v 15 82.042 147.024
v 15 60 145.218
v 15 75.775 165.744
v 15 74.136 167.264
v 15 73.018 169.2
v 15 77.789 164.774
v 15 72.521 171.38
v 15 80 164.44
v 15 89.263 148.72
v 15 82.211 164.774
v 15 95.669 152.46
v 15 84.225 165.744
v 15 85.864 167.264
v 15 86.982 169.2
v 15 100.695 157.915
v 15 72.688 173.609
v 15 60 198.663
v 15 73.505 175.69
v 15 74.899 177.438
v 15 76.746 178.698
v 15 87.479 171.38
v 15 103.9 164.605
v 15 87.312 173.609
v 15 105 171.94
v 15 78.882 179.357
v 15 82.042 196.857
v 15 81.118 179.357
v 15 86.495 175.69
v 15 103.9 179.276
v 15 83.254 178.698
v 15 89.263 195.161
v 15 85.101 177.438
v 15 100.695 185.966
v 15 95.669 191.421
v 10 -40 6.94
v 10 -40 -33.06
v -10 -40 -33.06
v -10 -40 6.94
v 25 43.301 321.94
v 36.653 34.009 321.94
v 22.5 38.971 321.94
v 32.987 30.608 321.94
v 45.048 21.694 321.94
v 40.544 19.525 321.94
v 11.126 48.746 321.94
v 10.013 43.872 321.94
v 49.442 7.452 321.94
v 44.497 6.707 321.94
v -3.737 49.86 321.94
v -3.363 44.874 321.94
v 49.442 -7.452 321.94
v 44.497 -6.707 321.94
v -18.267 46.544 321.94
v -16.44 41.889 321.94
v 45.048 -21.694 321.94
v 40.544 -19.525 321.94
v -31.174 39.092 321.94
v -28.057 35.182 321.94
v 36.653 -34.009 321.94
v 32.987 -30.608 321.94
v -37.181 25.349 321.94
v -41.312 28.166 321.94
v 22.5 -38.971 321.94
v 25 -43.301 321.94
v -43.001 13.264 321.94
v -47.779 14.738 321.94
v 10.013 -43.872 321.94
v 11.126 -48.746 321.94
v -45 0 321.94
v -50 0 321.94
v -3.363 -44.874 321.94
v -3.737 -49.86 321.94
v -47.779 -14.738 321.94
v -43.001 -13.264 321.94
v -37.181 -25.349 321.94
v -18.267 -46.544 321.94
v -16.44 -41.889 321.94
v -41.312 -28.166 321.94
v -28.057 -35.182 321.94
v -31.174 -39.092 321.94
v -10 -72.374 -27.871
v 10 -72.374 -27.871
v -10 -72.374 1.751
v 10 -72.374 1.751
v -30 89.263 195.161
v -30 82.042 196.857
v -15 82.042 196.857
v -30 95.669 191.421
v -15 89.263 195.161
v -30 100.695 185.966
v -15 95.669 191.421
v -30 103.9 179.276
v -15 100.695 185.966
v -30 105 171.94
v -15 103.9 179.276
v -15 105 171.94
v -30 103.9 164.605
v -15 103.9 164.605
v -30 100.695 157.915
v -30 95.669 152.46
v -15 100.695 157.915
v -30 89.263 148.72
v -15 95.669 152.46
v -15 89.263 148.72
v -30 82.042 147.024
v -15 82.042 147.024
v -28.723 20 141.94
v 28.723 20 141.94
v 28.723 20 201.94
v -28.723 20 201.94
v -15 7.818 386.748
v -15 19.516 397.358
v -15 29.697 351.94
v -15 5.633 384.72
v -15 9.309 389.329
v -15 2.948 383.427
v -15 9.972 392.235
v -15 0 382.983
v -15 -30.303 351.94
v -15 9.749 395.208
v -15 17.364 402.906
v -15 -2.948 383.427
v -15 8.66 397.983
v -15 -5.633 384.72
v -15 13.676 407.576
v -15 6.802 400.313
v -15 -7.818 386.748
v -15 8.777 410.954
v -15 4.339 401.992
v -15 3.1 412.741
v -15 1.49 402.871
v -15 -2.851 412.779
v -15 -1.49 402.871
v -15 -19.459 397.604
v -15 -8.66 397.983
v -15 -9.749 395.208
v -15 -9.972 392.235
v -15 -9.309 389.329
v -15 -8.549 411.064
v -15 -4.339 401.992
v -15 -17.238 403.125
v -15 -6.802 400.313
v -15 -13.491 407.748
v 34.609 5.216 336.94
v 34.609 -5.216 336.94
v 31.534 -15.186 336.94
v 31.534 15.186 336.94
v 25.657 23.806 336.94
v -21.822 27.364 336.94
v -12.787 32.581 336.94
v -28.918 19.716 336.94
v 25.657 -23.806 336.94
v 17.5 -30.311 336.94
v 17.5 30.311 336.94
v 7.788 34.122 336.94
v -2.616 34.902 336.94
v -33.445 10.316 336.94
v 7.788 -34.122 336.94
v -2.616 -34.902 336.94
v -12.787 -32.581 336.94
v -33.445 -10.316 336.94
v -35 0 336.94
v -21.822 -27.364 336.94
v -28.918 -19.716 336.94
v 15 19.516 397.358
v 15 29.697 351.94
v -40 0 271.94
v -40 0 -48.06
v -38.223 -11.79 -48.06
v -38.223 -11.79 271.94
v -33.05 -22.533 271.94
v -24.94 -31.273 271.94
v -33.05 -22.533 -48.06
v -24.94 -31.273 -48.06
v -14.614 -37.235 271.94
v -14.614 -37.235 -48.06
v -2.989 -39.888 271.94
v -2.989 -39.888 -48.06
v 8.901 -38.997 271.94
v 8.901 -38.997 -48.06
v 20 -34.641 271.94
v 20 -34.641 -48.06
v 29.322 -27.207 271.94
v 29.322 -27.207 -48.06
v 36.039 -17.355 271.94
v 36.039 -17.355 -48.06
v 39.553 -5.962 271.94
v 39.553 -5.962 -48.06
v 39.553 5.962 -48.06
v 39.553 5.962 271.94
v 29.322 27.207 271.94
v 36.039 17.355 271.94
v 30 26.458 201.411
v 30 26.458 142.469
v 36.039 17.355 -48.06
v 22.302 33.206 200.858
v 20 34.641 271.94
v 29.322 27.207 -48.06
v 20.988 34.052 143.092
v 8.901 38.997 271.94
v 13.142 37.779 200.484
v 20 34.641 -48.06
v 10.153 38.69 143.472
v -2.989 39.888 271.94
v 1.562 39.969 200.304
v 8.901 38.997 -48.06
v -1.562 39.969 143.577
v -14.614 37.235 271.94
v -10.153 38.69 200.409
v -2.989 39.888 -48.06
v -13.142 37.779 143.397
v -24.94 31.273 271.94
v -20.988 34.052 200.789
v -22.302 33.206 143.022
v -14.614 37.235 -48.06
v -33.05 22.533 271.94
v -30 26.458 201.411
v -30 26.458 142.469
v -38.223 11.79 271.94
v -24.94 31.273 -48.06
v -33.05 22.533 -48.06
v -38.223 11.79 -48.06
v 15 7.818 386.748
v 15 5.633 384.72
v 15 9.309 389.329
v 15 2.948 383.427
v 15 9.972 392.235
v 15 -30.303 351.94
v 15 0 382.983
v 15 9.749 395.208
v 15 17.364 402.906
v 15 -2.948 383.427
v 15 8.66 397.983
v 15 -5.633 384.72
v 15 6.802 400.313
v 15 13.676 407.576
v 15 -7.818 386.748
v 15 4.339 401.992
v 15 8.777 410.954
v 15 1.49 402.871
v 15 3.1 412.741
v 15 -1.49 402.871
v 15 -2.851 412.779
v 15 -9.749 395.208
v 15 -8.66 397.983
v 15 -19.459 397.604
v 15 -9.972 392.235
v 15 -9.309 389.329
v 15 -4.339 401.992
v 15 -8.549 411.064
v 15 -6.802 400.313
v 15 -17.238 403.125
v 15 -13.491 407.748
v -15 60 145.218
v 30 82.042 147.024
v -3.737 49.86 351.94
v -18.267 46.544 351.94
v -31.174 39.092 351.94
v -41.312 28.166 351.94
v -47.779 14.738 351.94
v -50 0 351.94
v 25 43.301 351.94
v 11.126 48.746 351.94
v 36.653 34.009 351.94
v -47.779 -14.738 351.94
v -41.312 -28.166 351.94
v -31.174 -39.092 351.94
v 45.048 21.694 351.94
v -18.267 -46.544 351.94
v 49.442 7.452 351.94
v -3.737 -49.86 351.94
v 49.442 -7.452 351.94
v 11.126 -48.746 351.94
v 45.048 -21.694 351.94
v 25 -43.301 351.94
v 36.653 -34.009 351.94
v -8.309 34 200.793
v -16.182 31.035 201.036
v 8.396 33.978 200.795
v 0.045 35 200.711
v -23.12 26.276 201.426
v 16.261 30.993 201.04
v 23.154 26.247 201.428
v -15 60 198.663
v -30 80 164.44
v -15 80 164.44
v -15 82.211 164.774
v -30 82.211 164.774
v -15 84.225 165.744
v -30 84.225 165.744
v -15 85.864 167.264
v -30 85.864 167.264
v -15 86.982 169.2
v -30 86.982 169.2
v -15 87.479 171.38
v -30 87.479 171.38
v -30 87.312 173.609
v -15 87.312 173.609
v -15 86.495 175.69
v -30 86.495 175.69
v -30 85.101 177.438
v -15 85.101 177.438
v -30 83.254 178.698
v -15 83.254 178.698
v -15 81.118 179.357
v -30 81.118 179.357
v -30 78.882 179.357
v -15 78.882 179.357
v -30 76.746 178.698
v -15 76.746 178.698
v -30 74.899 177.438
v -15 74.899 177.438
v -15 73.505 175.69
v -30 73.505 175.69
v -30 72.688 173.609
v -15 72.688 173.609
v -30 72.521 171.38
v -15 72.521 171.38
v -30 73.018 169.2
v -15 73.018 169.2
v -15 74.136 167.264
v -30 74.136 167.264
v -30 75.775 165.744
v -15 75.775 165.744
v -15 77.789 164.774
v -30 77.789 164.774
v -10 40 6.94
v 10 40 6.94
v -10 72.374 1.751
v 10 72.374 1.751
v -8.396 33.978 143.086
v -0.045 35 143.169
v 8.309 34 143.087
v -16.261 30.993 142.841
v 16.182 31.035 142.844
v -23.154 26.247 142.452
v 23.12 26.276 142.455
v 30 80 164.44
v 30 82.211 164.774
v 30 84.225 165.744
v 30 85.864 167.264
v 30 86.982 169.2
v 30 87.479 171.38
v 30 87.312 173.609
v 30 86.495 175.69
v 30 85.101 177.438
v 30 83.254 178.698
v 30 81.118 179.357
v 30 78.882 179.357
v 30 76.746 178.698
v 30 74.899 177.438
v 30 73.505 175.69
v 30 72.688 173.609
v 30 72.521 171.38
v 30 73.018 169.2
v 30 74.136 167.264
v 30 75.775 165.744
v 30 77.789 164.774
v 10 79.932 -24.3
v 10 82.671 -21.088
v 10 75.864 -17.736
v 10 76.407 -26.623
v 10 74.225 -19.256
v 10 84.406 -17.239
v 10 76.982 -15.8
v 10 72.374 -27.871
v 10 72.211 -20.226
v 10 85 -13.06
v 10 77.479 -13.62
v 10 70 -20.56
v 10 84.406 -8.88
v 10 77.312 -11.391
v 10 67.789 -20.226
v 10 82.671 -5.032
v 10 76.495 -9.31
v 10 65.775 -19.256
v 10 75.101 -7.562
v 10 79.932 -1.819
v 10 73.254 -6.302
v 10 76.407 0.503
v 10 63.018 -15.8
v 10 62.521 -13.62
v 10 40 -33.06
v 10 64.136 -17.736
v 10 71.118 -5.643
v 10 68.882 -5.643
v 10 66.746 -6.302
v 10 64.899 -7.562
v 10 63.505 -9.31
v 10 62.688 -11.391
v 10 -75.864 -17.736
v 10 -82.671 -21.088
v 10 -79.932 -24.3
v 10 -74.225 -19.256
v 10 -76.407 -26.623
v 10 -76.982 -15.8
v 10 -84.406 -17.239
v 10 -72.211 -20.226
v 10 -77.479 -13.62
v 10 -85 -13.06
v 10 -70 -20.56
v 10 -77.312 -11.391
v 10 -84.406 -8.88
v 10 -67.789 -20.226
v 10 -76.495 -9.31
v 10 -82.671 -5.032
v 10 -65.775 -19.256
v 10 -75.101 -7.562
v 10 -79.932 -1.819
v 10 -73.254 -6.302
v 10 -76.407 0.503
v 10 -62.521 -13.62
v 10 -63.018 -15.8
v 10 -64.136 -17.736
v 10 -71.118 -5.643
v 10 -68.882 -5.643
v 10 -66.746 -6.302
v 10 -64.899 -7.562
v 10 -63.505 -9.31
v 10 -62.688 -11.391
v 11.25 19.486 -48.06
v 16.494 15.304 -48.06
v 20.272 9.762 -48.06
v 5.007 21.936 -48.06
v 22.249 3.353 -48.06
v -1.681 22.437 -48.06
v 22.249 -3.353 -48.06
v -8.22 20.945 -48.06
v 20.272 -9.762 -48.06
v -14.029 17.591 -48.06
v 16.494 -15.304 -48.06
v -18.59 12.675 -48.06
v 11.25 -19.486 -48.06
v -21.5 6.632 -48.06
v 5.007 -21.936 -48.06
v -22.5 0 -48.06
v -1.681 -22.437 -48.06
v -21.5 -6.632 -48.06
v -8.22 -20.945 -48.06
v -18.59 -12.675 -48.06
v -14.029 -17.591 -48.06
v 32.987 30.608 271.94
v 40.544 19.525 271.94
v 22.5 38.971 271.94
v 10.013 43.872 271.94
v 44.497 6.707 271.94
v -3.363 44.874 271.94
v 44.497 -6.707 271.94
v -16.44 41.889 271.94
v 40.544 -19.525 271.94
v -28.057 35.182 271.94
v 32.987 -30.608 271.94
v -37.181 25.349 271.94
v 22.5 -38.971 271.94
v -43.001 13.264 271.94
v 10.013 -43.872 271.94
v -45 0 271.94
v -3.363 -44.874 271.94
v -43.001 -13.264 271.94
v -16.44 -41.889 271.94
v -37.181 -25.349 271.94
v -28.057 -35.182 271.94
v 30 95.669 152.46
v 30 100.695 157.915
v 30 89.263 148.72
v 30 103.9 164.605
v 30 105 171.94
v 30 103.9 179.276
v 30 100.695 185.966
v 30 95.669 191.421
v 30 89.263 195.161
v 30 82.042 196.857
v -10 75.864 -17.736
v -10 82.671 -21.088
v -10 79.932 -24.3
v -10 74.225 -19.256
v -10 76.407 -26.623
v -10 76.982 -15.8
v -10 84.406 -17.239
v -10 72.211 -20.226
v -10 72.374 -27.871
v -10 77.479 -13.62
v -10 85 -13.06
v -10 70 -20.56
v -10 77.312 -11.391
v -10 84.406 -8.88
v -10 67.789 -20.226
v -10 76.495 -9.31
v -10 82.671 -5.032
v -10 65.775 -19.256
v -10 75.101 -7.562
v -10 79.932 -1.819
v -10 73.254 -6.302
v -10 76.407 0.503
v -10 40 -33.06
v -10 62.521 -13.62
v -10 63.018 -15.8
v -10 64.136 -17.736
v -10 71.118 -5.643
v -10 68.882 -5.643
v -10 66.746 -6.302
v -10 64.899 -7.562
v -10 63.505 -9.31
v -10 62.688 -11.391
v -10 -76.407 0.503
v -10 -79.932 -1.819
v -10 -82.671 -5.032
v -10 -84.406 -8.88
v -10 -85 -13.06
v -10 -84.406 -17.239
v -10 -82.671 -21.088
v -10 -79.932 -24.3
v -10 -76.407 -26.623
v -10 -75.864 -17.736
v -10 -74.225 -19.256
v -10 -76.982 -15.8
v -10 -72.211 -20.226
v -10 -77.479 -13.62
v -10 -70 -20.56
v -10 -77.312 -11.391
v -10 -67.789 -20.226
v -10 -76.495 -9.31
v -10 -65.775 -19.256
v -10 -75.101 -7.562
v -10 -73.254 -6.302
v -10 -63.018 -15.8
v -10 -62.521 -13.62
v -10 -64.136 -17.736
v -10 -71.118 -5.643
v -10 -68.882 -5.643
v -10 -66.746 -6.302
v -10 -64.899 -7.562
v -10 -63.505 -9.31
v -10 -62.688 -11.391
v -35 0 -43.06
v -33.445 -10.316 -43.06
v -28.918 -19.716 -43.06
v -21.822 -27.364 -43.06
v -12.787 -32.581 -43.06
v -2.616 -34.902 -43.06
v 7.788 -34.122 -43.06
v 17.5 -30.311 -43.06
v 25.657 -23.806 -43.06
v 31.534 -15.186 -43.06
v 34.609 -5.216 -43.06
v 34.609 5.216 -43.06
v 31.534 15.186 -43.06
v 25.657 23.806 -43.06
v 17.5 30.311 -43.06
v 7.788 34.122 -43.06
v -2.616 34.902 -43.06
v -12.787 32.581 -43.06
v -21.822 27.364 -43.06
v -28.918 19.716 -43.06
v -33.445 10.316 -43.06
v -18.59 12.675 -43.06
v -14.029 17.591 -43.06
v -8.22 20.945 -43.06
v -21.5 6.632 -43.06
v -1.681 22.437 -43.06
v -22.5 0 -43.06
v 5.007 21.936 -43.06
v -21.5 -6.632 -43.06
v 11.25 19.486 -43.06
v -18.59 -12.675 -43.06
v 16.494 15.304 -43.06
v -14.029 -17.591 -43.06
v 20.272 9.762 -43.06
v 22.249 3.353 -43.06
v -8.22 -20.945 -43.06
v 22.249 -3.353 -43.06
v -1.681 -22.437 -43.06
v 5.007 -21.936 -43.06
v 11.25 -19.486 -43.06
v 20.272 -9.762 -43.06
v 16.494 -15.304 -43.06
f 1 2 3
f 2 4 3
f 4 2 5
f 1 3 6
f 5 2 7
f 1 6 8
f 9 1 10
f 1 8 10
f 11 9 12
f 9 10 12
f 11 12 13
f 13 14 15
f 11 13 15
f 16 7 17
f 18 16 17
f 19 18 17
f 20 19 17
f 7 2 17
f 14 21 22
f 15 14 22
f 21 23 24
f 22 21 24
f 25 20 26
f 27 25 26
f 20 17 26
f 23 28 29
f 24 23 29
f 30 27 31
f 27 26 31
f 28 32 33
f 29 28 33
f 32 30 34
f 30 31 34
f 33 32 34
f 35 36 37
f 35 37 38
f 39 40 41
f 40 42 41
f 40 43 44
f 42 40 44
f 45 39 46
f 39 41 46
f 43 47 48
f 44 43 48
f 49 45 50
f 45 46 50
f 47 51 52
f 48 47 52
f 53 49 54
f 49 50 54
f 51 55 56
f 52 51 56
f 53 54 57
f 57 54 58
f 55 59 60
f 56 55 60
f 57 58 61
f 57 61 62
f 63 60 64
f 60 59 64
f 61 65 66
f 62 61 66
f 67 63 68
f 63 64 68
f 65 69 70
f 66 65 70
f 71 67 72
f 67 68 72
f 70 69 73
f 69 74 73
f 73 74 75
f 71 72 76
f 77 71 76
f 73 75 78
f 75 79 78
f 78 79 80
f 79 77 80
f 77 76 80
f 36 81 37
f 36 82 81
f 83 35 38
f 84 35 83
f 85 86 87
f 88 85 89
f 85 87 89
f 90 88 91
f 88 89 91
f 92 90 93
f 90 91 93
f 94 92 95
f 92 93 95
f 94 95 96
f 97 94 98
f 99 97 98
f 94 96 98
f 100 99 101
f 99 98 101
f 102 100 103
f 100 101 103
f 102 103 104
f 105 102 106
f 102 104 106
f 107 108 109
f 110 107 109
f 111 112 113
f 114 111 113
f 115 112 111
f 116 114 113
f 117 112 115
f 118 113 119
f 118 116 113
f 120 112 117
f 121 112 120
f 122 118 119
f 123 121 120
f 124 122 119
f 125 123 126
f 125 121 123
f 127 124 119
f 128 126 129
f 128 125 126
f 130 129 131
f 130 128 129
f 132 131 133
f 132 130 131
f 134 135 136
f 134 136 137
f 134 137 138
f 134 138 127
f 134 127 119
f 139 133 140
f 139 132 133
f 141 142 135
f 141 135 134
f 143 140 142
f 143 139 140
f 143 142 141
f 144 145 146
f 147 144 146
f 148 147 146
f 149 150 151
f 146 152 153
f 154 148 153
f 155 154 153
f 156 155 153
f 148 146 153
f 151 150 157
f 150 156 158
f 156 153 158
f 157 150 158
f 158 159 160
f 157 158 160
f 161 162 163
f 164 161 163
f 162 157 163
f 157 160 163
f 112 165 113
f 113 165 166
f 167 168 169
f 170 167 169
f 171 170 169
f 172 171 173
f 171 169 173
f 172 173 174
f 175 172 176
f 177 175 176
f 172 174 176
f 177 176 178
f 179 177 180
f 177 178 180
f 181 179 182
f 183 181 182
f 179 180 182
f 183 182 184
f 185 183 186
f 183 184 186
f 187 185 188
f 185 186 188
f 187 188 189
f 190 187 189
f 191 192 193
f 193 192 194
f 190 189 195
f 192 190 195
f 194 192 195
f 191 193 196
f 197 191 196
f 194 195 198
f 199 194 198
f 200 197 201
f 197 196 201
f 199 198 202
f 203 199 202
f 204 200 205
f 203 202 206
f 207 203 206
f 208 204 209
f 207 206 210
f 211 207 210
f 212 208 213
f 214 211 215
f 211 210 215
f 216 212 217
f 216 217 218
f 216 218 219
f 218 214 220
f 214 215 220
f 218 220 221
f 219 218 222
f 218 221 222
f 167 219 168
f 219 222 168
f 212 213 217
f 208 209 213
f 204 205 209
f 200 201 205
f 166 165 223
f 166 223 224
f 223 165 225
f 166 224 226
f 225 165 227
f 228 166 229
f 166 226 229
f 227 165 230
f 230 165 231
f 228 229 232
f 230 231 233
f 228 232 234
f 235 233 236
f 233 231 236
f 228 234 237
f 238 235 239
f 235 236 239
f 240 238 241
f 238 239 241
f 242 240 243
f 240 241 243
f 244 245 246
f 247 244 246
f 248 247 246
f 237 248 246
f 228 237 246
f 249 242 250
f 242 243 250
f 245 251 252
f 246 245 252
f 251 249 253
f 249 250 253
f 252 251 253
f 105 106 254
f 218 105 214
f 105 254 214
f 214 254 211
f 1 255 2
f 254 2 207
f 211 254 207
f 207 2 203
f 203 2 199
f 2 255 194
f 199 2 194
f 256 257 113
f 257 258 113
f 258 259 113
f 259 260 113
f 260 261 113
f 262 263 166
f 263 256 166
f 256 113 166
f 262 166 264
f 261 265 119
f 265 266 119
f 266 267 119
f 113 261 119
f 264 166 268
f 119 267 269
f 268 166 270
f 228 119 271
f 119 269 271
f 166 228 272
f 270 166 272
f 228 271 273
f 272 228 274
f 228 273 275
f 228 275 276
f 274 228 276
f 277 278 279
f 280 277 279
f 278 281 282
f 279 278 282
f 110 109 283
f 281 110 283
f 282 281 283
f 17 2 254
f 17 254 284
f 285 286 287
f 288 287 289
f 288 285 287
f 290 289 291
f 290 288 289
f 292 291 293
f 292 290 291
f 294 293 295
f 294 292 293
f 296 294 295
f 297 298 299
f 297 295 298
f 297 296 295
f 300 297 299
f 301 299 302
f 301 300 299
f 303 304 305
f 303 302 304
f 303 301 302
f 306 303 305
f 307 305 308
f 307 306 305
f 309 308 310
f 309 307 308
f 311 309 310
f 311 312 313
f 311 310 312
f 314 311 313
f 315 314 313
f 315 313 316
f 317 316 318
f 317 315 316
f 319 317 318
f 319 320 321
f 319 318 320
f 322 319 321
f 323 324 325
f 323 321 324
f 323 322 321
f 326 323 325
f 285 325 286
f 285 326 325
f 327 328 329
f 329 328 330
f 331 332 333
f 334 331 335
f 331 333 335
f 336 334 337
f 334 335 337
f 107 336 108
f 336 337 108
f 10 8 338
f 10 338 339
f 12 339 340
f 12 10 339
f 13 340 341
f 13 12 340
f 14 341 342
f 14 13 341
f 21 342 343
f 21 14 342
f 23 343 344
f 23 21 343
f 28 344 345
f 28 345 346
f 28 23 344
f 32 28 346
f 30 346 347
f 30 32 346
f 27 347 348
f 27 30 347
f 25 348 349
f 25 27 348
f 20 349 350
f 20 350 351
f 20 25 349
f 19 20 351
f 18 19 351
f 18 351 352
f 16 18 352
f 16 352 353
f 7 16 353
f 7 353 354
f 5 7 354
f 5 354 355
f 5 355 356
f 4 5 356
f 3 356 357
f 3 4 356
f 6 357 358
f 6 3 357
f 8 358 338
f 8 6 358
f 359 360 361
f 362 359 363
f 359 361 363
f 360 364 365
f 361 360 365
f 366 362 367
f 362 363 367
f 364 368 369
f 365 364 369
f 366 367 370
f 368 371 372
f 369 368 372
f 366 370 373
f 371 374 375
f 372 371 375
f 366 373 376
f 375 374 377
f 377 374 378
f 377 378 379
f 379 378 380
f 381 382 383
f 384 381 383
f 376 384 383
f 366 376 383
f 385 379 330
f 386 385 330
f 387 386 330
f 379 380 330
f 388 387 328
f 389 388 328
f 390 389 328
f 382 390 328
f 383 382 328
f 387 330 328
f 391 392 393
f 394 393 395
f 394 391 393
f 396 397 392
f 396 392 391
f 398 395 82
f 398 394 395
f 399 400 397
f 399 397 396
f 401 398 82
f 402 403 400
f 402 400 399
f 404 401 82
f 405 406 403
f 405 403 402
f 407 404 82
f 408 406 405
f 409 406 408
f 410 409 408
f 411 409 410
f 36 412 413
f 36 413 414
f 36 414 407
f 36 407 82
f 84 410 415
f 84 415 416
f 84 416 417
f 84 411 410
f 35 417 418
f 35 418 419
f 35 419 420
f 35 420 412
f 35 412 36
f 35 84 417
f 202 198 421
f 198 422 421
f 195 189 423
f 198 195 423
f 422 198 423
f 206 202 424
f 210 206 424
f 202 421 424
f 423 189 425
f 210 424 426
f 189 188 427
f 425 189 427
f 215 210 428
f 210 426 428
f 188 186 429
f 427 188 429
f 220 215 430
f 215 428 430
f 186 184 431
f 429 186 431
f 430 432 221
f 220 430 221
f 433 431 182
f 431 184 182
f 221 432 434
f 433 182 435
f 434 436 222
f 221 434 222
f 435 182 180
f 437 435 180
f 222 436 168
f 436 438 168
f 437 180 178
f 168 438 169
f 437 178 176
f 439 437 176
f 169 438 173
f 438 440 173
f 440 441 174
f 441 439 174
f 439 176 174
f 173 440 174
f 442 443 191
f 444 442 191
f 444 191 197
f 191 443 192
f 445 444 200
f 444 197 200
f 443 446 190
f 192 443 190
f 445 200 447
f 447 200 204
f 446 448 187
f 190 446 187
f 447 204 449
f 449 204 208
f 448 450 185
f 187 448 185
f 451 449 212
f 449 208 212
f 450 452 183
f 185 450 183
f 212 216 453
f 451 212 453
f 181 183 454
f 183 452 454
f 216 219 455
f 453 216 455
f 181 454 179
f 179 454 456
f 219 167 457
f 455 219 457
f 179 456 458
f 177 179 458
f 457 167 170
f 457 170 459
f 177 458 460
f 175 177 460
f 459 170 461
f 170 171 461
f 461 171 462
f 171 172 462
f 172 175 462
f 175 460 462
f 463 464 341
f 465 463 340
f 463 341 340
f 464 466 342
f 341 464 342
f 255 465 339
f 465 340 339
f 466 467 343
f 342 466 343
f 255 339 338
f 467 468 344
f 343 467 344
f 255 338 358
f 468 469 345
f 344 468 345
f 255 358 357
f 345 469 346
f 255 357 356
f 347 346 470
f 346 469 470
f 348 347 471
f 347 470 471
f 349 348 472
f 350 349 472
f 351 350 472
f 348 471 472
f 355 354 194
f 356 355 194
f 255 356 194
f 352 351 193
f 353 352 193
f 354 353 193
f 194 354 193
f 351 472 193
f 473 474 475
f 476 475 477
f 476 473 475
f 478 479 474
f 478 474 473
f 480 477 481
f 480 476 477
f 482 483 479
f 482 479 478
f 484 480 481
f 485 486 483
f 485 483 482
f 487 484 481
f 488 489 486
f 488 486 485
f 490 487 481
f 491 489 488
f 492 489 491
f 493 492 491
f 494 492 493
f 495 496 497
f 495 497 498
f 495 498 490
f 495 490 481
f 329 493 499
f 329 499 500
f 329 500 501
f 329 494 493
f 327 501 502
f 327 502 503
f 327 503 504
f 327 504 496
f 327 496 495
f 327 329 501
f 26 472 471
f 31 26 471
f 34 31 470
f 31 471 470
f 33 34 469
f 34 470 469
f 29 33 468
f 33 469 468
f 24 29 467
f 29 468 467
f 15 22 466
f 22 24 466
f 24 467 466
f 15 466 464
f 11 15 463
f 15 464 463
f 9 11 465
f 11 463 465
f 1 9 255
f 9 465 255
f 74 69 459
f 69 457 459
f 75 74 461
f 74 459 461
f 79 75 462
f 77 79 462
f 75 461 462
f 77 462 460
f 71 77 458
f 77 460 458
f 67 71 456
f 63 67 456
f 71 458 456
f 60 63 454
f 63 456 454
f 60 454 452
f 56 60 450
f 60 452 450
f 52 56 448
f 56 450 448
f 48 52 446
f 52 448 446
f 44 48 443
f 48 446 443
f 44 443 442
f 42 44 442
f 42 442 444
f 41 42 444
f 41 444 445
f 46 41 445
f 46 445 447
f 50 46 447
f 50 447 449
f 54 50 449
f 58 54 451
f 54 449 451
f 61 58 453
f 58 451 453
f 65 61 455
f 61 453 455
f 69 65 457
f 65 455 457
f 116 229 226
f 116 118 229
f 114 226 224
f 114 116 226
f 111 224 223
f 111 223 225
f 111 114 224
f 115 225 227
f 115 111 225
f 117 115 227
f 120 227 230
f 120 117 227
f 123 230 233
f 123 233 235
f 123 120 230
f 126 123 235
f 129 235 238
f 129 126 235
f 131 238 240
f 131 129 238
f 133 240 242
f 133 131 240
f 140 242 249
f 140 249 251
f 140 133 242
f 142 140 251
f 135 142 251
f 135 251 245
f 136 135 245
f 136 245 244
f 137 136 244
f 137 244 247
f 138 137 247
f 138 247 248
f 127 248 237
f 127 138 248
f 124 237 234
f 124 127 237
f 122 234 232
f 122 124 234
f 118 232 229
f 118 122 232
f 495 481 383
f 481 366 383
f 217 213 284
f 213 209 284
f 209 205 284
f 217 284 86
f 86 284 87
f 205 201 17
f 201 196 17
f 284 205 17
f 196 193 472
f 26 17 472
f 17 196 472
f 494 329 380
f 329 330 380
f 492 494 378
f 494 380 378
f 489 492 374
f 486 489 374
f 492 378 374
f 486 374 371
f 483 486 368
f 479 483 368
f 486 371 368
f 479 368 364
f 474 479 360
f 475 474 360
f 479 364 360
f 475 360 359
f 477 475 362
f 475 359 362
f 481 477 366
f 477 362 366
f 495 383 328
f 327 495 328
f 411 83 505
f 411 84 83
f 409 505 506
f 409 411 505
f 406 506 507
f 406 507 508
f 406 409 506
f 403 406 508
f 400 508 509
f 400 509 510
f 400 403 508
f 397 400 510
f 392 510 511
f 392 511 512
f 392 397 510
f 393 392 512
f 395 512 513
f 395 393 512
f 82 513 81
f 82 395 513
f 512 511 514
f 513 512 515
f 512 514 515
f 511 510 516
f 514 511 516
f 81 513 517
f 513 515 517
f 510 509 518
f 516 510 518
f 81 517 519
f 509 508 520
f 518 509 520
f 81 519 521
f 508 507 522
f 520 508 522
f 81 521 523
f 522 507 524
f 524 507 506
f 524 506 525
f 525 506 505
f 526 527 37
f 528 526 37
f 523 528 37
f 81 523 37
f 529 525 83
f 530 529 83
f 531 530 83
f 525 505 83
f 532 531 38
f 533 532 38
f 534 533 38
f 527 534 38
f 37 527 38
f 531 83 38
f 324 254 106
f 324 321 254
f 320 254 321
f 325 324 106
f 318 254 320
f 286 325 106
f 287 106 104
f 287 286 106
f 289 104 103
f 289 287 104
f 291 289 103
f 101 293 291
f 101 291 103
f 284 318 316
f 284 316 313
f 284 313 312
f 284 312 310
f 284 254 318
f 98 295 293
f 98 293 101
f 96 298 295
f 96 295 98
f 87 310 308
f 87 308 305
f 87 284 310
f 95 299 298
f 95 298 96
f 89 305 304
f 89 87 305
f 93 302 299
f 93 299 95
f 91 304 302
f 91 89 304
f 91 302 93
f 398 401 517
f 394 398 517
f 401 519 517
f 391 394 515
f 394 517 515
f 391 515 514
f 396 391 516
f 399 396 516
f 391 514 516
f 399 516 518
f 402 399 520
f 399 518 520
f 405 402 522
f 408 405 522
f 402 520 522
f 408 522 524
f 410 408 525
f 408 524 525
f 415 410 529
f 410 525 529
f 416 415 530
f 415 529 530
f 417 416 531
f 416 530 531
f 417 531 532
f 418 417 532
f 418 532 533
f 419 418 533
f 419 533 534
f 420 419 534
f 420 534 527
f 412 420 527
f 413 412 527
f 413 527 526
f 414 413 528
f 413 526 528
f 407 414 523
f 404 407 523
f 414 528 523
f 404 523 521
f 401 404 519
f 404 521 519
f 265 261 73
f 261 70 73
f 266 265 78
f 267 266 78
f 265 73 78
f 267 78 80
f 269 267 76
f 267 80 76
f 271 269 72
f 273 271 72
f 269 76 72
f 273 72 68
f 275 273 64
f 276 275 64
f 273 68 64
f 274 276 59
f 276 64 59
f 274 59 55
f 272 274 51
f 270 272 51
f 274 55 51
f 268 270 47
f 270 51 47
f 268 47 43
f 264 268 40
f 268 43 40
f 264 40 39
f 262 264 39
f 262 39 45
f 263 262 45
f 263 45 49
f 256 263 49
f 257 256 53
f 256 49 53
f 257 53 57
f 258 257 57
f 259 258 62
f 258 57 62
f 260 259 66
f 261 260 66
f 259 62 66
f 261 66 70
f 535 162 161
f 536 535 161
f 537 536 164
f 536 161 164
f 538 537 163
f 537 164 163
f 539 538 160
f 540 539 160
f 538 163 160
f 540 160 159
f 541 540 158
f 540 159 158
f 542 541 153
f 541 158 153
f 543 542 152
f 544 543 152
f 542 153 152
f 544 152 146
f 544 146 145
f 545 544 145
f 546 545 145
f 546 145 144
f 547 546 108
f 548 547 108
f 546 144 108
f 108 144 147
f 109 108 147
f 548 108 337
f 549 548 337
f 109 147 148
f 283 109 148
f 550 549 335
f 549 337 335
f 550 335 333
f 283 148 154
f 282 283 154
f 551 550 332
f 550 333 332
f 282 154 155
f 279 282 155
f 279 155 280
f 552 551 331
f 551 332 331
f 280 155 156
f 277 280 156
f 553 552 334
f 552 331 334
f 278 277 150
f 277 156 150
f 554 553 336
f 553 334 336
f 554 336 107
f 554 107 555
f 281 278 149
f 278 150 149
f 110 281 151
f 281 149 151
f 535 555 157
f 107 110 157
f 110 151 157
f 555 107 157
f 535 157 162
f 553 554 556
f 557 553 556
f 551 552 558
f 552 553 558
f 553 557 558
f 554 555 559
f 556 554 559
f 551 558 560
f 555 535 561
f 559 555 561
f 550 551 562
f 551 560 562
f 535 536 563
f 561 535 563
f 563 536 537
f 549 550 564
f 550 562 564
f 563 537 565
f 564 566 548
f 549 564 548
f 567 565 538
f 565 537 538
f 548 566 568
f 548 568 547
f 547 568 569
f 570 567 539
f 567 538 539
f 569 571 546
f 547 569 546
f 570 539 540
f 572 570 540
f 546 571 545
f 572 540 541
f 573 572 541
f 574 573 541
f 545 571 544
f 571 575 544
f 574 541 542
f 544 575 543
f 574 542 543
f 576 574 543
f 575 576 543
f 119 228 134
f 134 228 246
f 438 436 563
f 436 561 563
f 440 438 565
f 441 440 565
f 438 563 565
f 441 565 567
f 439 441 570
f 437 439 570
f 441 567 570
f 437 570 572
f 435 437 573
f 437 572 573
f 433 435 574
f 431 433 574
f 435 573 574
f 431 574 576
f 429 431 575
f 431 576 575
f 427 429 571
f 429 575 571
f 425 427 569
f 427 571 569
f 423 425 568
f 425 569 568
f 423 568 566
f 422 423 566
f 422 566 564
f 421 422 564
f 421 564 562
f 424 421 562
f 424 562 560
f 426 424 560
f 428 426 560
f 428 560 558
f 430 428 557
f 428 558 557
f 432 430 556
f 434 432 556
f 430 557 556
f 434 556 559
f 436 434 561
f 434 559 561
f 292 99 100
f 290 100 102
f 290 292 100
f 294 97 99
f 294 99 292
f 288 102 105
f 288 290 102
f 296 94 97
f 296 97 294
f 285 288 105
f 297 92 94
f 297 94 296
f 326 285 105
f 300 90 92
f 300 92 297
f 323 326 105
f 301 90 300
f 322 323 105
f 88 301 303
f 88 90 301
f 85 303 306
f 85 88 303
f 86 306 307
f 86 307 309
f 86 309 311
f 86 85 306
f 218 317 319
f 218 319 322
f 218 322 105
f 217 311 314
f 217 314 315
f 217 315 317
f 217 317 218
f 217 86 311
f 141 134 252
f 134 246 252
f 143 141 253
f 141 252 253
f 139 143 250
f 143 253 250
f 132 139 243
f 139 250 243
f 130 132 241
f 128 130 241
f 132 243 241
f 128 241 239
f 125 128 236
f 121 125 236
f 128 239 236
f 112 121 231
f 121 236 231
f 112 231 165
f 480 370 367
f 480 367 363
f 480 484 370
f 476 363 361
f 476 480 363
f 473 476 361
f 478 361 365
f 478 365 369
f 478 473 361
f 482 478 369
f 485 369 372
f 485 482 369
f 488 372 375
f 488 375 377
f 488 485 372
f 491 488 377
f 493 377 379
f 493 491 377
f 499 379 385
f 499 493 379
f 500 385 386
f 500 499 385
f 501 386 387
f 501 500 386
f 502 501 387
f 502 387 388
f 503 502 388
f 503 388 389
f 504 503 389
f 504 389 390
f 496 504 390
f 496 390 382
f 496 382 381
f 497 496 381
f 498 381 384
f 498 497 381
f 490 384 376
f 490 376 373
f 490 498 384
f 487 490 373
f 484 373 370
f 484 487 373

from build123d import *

# Parameters (mm, degrees)
SKETCH3_R           = 10
BOSS_EXTRUDE1_DEPTH = 15
SKETCH4_R           = 7.5
BOSS_EXTRUDE3_DEPTH = 10
SKETCH6_R           = 7.5
BOSS_EXTRUDE4_DEPTH = 30
SKETCH7_W           = 70
SKETCH7_H           = 80
CUT_EXTRUDE5_DEPTH  = 15


with BuildPart() as part:
    # Sketch1 → Revolve1 (revolve)
    with BuildSketch(Plane.YZ, mode=Mode.PRIVATE) as revolve1_sk:
        Polygon((0, 336.940298507), (0, 351.940298507), (50, 351.940298507), (50, 321.940298507), (45, 321.940298507), (45, 271.940298507), (40, 271.940298507), (40, -48.059701493), (22.5, -48.059701493), (22.5, -43.059701493), (35, -43.059701493), (35, 336.940298507), align=None)
    revolve(revolve1_sk.sketch.rotate(Axis((0, 0, 336.940298507), (0, 0, 1)), 90), axis=Axis((0, 0, 336.940298507), (0, 0, 1)))

    # Sketch3 → Boss-Extrude1 (add, symmetric)
    with BuildSketch(Plane.YZ):
        with BuildLine():
            Line((29.697185321, 351.940298507), (-30.302814679, 351.940298507))
            Line((-30.302814679, 351.940298507), (-19.458836039, 397.603771946))
            ThreePointArc((-19.458836039, 397.603771946), (0.126257133, 412.982367034), (19.515627425, 397.357726842))
            Line((19.515627425, 397.357726842), (29.697185321, 351.940298507))
        make_face()
        with Locations(Location((0, 392.98276556, 0), (0, 0, 270))):
            Circle(SKETCH3_R, mode=Mode.SUBTRACT)
    extrude(amount=BOSS_EXTRUDE1_DEPTH, both=True)

    # Sketch6 → Boss-Extrude4 (add, symmetric)
    with BuildSketch(Plane.YZ):
        with BuildLine():
            Line((20, 141.940298507), (20, 201.940298507))
            Line((20, 201.940298507), (82.041582998, 196.856797837))
            ThreePointArc((82.041582998, 196.856797837), (105, 171.940298507), (82.041582998, 147.023799177))
            Line((82.041582998, 147.023799177), (20, 141.940298507))
        make_face()
        with Locations(Location((80, 171.940298507, 0), (0, 0, 270))):
            Circle(SKETCH6_R, mode=Mode.SUBTRACT)
    extrude(amount=BOSS_EXTRUDE4_DEPTH, both=True)

    # Sketch7 → Cut-Extrude5 (cut, symmetric)
    with BuildSketch(Plane.YZ):
        with Locations((95, 171.940298507)):
            Rectangle(SKETCH7_W, SKETCH7_H)
    extrude(amount=CUT_EXTRUDE5_DEPTH, both=True, mode=Mode.SUBTRACT)


with BuildPart() as body_2:
    # Sketch4 → Boss-Extrude3 (new, symmetric)
    with BuildSketch(Plane.YZ):
        with BuildLine():
            Line((40, 6.940298507), (72.373967528, 1.7512498))
            ThreePointArc((72.373967528, 1.7512498), (85, -13.059701493), (72.373967528, -27.870652785))
            Line((72.373967528, -27.870652785), (40, -33.059701493))
            Line((40, -33.059701493), (40, 6.940298507))
        make_face()
        with Locations(Location((70, -13.059701493, 0), (0, 0, 270))):
            Circle(SKETCH4_R, mode=Mode.SUBTRACT)
    extrude(amount=BOSS_EXTRUDE3_DEPTH, both=True)


with BuildPart() as body_3:
    # Mirror3: mirrored copy
    add(body_2.part.mirror(Plane.ZX))


solid = Compound([part.part, body_2.part, body_3.part])
